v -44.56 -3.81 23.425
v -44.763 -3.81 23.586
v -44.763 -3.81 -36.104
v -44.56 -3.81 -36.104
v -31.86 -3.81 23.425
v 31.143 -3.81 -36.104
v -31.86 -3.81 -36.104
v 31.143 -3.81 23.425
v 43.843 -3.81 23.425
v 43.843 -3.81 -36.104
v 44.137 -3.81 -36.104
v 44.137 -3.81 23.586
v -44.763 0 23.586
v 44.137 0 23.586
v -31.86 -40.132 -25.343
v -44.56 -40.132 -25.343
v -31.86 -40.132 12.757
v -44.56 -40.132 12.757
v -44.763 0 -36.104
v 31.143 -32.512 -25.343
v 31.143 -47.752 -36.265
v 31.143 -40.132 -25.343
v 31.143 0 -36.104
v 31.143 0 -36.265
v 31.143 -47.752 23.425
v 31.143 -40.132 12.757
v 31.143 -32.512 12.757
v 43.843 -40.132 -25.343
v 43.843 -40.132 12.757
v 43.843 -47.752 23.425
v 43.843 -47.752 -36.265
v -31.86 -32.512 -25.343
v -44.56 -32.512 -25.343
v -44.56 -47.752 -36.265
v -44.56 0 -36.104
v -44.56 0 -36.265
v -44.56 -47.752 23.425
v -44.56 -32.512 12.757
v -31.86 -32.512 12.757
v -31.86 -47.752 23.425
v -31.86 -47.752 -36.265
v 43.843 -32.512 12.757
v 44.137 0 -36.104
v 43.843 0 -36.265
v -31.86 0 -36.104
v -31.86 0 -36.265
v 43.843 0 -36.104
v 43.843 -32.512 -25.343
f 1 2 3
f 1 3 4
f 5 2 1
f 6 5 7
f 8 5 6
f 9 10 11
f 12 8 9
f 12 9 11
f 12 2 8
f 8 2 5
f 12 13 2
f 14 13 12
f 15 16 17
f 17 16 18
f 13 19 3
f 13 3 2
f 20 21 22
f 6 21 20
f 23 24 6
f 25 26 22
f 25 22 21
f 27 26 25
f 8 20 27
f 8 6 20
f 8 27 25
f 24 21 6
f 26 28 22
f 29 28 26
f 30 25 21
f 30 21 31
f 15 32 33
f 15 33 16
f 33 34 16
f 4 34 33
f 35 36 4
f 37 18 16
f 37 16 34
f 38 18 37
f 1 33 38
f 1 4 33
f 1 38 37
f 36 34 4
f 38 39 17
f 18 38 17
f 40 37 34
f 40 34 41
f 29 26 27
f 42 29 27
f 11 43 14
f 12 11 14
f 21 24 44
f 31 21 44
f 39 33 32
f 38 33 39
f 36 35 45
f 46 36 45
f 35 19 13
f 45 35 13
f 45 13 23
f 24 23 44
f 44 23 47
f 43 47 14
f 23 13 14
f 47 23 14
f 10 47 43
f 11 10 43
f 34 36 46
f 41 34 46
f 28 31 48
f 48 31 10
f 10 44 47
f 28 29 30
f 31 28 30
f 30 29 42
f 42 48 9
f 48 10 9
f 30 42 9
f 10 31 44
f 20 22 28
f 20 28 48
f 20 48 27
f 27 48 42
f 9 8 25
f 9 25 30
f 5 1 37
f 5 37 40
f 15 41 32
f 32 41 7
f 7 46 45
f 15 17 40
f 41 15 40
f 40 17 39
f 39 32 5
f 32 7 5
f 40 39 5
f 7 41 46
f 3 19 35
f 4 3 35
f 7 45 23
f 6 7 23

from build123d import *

# Parameters (mm, degrees)
F0_W          = 88.9
F0_H          = 59.69
F1_DEPTH      = 3.81
F2_W          = 12.7
F2_H          = 59.69
F3_DEPTH      = 47.752
F4_W          = 7.62
F4_H          = 38.1
F5_DEPTH      = 25.4
F5_DEPTH_BACK = 25.4
F6_W          = 7.62
F6_H          = 38.1
F7_DEPTH      = 25.4
F7_DEPTH_BACK = 25.4


with BuildPart() as f1:
    # F0 (on Front) → F1 (new body)
    with BuildSketch(Plane.XZ):
        with Locations((-0.312539, -6.258952)):
            Rectangle(F0_W, F0_H)
    extrude(amount=F1_DEPTH)

    # F2 (on Front) → F3 (join)
    with BuildSketch(Plane.XZ):
        with Locations((-38.210436, -6.419758)):
            Rectangle(F2_W, F2_H)
        with Locations((37.492607, -6.419758)):
            Rectangle(F2_W, F2_H)
    extrude(amount=F3_DEPTH)

    # F4 (on face) → F5 (cut, two sides)
    with BuildSketch(Plane.YZ.offset(43.842607)) as f5_sk:
        with Locations((-36.322, -6.292758)):
            Rectangle(F4_W, F4_H)
    extrude(amount=-F5_DEPTH, mode=Mode.SUBTRACT)
    extrude(f5_sk.sketch, amount=-F5_DEPTH_BACK, mode=Mode.SUBTRACT)

    # F6 (on face) → F7 (cut, two sides)
    with BuildSketch(Plane(origin=(-44.560436, 0, 0), x_dir=(0, -1, 0), z_dir=(-1, 0, 0))) as f7_sk:
        with Locations((36.322, -6.292758)):
            Rectangle(F6_W, F6_H)
    extrude(amount=-F7_DEPTH, mode=Mode.SUBTRACT)
    extrude(f7_sk.sketch, amount=-F7_DEPTH_BACK, mode=Mode.SUBTRACT)


solid = f1.part
